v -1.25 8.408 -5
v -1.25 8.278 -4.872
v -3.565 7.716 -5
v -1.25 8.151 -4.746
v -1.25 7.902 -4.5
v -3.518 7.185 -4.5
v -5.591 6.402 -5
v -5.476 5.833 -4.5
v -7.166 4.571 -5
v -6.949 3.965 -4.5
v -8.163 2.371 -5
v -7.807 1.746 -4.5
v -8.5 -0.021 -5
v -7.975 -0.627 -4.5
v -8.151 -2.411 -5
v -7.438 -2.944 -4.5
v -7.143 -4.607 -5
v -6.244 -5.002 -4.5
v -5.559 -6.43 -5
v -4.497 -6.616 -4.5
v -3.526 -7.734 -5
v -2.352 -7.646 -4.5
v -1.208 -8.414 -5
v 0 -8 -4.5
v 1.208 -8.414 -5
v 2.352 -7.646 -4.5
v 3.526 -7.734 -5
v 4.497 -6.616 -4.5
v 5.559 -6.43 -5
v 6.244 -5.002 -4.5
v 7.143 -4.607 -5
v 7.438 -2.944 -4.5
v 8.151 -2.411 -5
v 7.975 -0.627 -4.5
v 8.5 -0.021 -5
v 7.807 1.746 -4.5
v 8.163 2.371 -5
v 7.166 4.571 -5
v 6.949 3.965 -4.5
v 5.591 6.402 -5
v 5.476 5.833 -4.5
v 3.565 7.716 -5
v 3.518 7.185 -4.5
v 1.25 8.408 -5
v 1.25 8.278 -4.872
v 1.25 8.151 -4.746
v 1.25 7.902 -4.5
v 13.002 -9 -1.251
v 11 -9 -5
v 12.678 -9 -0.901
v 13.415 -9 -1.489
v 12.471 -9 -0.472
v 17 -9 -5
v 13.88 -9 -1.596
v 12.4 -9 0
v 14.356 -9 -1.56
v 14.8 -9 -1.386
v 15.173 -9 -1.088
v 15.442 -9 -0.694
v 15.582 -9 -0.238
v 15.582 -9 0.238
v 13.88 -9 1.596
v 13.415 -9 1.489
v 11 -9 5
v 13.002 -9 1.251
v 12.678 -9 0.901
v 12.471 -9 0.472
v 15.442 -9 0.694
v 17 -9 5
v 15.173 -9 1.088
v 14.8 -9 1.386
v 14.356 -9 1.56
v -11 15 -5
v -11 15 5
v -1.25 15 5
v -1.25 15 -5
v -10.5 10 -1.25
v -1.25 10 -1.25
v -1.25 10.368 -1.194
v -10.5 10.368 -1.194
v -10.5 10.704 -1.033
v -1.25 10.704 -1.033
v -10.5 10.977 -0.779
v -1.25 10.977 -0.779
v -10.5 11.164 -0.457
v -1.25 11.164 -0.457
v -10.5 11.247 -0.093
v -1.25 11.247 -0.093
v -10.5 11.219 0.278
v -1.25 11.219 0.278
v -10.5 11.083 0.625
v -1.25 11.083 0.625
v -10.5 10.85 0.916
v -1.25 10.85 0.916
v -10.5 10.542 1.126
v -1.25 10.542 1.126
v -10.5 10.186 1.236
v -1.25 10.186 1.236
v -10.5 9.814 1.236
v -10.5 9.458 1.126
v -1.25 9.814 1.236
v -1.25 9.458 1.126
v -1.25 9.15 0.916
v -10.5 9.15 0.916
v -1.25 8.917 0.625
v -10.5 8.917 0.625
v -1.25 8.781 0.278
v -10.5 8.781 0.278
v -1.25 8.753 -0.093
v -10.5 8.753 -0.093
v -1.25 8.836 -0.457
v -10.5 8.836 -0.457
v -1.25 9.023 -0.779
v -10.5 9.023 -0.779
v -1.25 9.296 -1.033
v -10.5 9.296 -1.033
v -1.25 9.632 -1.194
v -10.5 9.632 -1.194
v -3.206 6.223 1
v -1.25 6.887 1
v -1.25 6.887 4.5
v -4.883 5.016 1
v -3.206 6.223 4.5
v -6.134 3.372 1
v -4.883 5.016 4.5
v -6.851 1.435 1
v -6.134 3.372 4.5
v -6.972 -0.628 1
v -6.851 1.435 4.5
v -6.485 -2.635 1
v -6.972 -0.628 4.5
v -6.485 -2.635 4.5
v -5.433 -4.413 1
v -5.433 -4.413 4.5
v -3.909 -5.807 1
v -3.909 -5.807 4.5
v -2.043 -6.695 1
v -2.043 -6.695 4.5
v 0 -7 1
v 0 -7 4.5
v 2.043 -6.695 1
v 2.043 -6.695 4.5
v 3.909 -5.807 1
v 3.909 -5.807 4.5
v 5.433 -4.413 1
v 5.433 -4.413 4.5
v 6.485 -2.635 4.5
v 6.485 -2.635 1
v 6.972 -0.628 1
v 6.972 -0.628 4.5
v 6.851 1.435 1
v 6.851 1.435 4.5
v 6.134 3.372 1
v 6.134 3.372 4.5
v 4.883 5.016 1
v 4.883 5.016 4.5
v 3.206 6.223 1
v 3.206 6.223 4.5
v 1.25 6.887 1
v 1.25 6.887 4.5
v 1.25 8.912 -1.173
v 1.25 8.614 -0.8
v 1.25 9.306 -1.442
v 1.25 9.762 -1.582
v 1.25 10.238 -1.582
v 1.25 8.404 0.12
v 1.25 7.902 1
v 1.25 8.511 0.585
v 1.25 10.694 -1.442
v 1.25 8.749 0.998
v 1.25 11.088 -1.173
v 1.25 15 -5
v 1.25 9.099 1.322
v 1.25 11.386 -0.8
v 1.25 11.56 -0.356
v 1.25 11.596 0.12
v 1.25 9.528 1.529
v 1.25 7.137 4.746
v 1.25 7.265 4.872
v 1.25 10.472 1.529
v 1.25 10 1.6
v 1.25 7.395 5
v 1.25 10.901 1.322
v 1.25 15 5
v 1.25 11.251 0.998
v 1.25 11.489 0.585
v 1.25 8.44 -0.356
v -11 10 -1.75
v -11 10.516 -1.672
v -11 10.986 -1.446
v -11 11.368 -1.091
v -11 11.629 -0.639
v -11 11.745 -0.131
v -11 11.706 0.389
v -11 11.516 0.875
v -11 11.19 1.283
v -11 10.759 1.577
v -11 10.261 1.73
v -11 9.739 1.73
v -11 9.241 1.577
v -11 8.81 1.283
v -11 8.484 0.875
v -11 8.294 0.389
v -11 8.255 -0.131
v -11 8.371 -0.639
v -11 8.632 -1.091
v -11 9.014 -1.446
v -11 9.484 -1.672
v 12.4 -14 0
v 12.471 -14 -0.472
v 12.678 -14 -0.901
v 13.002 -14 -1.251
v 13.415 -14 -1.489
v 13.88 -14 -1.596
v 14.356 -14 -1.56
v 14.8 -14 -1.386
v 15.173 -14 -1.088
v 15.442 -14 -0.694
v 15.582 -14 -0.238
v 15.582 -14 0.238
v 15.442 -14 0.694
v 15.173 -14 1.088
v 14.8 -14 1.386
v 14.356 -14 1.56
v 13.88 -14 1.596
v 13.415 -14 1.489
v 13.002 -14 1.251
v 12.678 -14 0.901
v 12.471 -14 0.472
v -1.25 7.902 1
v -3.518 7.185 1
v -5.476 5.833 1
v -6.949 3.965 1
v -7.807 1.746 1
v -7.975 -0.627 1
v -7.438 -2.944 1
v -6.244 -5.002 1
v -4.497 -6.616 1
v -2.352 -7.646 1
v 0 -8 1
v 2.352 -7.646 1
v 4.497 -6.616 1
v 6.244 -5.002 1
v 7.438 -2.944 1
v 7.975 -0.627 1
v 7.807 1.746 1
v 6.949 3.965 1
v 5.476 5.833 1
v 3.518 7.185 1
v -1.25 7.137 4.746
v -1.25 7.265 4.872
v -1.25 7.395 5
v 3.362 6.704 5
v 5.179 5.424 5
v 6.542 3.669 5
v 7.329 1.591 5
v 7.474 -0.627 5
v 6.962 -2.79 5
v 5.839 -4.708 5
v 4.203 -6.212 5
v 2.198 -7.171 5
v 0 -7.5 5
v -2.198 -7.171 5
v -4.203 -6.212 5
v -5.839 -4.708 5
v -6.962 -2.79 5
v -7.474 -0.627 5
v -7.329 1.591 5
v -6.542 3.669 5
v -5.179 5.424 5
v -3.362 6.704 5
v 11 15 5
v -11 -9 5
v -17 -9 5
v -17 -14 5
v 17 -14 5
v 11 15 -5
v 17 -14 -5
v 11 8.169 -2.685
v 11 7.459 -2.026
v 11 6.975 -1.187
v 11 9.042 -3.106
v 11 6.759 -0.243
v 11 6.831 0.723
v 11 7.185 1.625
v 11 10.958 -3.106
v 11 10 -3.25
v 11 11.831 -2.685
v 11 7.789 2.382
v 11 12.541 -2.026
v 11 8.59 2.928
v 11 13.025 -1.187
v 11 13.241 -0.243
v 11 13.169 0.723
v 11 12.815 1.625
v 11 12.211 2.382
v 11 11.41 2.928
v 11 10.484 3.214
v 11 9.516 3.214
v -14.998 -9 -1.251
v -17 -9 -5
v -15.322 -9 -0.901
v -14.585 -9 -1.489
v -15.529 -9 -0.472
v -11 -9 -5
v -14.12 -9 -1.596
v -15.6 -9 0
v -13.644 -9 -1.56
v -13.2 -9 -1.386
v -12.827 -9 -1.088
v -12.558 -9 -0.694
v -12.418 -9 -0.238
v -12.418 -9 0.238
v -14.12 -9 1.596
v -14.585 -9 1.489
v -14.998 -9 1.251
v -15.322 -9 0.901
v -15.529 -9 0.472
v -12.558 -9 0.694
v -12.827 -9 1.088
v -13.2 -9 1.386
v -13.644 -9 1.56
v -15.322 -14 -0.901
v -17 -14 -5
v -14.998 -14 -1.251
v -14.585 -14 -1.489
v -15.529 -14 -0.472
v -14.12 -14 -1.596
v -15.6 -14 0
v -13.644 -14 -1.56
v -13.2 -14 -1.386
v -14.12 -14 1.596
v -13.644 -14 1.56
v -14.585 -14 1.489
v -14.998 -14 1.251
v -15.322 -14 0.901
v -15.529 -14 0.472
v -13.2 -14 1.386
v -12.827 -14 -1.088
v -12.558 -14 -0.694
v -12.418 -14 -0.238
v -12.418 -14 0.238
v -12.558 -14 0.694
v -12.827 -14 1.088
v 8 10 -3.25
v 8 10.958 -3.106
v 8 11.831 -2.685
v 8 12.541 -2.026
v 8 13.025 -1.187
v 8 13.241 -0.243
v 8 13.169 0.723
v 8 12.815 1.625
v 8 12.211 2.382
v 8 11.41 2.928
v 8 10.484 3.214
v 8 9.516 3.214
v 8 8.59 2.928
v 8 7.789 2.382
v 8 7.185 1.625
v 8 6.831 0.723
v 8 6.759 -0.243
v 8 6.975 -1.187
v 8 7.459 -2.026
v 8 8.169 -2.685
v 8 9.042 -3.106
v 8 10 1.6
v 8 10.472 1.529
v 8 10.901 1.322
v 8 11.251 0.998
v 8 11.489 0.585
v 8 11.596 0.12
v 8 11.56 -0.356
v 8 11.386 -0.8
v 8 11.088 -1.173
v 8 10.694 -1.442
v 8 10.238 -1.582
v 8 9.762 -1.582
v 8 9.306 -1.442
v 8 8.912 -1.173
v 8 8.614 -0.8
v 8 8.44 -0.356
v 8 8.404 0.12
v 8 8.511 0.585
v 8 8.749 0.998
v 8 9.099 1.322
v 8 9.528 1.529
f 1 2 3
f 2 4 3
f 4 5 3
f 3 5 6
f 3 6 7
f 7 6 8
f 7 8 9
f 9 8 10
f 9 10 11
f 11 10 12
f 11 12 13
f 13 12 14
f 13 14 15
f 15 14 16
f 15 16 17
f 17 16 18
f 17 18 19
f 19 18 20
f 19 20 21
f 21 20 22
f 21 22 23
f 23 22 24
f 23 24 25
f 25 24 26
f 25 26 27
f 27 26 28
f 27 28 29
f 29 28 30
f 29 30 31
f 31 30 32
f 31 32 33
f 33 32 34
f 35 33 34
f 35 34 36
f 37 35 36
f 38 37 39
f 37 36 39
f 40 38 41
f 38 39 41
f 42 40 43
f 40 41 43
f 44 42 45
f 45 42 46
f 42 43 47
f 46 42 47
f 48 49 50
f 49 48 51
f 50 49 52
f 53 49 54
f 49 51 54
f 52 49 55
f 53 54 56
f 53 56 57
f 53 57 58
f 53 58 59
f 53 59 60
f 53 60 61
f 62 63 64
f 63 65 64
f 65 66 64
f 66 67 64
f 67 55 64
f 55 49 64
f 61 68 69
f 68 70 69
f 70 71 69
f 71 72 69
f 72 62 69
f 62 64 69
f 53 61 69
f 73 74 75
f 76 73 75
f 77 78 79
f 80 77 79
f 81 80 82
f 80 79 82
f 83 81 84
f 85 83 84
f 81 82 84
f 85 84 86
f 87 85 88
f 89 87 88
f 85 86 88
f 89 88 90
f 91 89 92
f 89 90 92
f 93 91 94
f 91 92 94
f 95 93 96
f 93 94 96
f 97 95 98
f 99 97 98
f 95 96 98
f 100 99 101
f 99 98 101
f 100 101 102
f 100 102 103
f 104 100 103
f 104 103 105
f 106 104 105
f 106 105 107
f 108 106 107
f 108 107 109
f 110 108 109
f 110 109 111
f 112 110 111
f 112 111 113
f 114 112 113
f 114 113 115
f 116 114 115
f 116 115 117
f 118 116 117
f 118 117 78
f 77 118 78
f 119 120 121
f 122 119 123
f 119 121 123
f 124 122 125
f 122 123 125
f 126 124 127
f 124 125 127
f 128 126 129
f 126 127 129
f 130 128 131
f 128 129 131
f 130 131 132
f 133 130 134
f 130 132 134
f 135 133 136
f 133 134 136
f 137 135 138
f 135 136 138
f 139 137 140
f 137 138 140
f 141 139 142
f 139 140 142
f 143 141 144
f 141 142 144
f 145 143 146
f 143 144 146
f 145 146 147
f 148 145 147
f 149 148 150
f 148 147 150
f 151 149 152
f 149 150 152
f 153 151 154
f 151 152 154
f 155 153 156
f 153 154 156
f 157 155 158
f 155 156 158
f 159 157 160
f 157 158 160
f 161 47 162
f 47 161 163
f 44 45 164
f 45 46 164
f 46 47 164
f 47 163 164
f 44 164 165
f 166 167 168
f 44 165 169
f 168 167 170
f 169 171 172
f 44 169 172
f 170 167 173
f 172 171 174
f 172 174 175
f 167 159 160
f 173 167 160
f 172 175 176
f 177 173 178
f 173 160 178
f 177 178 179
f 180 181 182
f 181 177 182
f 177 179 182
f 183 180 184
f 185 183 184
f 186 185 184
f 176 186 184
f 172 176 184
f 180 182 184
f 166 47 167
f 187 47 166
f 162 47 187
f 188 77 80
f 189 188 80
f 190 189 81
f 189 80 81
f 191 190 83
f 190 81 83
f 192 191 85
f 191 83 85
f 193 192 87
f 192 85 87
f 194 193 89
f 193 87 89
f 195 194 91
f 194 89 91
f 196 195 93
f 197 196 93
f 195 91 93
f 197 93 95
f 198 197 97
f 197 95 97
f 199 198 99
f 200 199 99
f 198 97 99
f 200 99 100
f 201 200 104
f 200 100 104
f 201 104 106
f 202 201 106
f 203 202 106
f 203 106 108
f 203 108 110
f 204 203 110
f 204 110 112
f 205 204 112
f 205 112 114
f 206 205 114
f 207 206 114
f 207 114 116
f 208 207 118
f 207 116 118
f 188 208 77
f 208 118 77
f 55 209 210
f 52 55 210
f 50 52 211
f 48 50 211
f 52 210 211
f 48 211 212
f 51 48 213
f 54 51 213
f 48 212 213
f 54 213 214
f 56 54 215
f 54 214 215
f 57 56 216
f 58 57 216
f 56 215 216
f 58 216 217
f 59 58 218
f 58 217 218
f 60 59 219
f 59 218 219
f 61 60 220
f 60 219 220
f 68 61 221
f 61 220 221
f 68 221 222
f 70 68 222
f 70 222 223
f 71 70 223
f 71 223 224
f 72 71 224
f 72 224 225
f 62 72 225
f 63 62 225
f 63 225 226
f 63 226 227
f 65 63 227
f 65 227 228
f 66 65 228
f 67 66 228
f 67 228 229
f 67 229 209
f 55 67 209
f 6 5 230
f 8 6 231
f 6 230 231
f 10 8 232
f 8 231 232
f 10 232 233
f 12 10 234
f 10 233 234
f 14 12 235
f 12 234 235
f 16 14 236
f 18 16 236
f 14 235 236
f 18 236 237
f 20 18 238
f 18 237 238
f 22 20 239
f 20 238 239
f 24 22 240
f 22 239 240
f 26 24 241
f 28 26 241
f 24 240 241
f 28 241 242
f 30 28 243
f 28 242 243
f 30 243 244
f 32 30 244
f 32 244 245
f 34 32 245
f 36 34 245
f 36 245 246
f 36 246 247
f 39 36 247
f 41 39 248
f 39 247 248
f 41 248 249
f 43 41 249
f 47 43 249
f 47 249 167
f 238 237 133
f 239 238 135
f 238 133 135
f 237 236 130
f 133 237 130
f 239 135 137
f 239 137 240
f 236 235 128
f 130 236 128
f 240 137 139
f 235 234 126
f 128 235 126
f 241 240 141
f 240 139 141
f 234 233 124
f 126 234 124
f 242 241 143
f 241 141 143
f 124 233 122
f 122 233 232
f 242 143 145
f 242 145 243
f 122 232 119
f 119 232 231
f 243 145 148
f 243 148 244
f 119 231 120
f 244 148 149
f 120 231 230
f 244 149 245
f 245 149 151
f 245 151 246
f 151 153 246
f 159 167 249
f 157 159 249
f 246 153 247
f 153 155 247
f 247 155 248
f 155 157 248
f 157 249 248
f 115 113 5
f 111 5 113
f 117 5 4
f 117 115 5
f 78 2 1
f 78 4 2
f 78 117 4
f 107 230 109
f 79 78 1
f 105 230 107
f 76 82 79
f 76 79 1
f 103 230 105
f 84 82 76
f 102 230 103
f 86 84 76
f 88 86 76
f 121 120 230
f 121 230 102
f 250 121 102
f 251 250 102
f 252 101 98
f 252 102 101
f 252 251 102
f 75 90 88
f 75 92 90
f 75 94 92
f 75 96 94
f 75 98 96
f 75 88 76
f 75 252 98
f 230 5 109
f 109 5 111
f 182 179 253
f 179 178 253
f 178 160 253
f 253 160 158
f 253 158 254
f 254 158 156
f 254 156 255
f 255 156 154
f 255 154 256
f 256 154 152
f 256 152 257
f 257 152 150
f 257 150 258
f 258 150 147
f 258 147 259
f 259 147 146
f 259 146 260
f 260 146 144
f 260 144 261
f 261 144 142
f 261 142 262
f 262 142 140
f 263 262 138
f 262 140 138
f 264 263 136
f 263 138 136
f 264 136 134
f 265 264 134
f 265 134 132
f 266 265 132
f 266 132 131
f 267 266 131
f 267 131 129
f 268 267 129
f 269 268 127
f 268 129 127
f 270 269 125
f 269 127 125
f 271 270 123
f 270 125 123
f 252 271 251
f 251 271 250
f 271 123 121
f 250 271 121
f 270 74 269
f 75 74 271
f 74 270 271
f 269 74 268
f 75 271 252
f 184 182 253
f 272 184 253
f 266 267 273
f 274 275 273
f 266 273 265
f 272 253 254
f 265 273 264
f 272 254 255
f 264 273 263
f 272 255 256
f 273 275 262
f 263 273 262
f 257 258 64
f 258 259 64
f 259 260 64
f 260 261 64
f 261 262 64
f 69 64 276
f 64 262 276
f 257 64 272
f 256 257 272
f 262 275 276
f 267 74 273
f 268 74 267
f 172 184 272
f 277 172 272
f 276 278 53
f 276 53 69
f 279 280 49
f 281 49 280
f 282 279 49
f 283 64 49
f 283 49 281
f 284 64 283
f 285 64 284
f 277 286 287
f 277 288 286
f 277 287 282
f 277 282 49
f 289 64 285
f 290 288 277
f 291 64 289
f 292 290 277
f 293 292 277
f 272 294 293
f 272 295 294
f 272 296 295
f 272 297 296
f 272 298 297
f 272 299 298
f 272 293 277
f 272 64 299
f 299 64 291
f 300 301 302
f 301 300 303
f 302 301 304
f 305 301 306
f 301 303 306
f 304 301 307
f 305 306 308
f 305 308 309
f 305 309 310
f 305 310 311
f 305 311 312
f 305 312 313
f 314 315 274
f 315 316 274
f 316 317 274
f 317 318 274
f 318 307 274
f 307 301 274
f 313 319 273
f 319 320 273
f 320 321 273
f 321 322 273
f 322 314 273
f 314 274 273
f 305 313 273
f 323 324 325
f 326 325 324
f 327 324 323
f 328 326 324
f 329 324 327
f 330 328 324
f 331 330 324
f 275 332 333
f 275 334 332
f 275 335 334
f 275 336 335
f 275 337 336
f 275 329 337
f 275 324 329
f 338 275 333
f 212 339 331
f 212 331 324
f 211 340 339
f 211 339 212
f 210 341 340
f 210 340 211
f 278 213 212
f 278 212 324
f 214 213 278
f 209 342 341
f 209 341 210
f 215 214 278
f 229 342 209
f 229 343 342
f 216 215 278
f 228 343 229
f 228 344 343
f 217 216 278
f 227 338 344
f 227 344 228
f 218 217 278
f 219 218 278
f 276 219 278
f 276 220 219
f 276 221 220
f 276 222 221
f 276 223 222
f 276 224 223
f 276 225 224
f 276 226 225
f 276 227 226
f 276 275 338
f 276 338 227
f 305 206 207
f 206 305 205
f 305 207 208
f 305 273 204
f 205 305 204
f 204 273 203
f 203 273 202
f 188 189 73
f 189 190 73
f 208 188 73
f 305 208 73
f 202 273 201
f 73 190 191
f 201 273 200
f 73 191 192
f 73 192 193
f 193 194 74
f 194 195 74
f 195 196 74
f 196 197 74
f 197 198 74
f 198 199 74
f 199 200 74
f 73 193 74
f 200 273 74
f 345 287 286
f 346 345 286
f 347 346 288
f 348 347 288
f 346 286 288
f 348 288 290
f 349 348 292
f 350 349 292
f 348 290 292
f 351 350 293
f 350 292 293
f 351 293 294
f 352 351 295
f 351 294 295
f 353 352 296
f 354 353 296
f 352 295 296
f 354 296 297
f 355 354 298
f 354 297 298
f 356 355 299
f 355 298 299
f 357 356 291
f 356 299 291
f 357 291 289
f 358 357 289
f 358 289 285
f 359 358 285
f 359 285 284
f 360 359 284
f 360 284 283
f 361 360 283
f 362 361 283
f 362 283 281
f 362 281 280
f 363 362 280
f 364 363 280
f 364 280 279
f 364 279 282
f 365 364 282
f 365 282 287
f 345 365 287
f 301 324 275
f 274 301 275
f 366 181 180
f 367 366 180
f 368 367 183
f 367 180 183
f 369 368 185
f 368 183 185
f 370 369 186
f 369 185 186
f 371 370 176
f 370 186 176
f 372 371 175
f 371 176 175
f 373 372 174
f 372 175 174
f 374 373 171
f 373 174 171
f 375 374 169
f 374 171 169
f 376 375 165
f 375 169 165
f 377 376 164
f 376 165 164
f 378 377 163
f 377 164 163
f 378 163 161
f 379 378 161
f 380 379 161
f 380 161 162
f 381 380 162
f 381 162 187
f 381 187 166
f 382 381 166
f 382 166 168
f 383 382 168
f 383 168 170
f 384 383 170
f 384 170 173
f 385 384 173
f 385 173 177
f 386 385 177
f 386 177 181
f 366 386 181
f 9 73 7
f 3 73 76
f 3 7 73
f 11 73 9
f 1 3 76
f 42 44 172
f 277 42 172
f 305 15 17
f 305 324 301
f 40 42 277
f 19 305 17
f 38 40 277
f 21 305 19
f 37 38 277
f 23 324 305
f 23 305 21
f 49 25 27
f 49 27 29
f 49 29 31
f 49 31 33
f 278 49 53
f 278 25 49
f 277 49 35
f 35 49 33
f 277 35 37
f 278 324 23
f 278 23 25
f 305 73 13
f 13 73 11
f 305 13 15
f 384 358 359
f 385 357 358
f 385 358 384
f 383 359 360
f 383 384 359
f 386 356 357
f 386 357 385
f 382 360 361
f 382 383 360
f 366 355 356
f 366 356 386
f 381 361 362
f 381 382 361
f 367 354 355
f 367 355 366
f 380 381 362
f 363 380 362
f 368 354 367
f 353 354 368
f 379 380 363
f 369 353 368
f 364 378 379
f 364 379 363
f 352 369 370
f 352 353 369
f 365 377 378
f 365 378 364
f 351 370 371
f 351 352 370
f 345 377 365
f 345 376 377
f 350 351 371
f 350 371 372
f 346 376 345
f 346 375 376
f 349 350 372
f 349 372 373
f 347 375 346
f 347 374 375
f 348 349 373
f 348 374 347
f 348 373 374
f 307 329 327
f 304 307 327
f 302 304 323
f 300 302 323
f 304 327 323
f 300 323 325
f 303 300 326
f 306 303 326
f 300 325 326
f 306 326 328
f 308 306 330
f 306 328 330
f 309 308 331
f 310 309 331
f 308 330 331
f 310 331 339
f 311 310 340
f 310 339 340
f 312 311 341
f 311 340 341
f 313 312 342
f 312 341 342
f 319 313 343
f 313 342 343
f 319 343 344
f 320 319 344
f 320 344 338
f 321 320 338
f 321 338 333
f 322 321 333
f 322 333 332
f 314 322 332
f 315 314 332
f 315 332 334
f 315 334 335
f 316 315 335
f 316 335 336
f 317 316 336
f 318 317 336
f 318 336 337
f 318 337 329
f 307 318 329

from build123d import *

# Parameters (mm, degrees)
SKETCH1_W                      = 22
SKETCH1_H                      = 29
BOSS_EXTRUDE1_DEPTH            = 5
SKETCH3_W                      = 34
SKETCH3_H                      = 10
BOSS_EXTRUDE2_DEPTH            = 5
F_16_0_16_DIAMETER_HOLE1_D     = 16
F_16_0_16_DIAMETER_HOLE1_DEPTH = 6
F_14_0_14_DIAMETER_HOLE1_D     = 14
M3_CLEARANCE_HOLE1_D           = 3.2
SKETCH12_W                     = 2.5
SKETCH12_H                     = 8.112511343
CUT_EXTRUDE1_DEPTH             = 25.779023387
M3X0_5_TAPPED_HOLE1_D          = 2.5
M3X0_5_TAPPED_HOLE1_DEPTH      = 9.75
CBORE_FOR_M3_SHCS1_D           = 3.2
CBORE_FOR_M3_SHCS1_DEPTH       = 9.75
CBORE_FOR_M3_SHCS1_CBORE_D     = 6.5
CBORE_FOR_M3_SHCS1_CBORE_DEPTH = 3
CHAMFER1_SIZE                  = 0.5


with BuildPart() as part:
    # Sketch1 → Boss-Extrude1 (new, symmetric)
    with BuildSketch(Plane.XY):
        with Locations((0, 0.5)):
            Rectangle(SKETCH1_W, SKETCH1_H)
    extrude(amount=BOSS_EXTRUDE1_DEPTH, both=True)

    # Sketch3 → Boss-Extrude2 (add)
    with BuildSketch(Plane.XZ.offset(14)):
        Rectangle(SKETCH3_W, SKETCH3_H)
    extrude(amount=-BOSS_EXTRUDE2_DEPTH)

    # Ø16.0 (16) Diameter Hole1
    with Locations(Plane(origin=(0, 0, -5), x_dir=(-1, 0, 0), z_dir=(0, 0, -1))):
        with Locations((0, 0)):
            Hole(F_16_0_16_DIAMETER_HOLE1_D / 2, depth=F_16_0_16_DIAMETER_HOLE1_DEPTH)

    # Ø14.0 (14) Diameter Hole1 (through all)
    with Locations(Plane(origin=(0, 0, 1), x_dir=(-1, 0, 0), z_dir=(0, 0, -1))):
        with Locations((0, 0)):
            Hole(F_14_0_14_DIAMETER_HOLE1_D / 2)

    # M3 Clearance Hole1 (through all)
    with Locations(Plane(origin=(0, -9, 0), x_dir=(1, 0, 0), z_dir=(0, 1, 0))):
        with Locations((-14, 0), (14, 0)):
            Hole(M3_CLEARANCE_HOLE1_D / 2)

    # Sketch12 → Cut-Extrude1 (cut, through all)
    with BuildSketch(Plane.XY.offset(5)):
        with Locations((0, 10.943744329)):
            Rectangle(SKETCH12_W, SKETCH12_H)
    extrude(amount=-CUT_EXTRUDE1_DEPTH, mode=Mode.SUBTRACT)

    # M3x0.5 Tapped Hole1
    with Locations(Plane.ZY.offset(11)):
        with Locations((0, 10)):
            Hole(M3X0_5_TAPPED_HOLE1_D / 2, depth=M3X0_5_TAPPED_HOLE1_DEPTH)

    # CBORE for M3 SHCS1
    with Locations(Plane(origin=(11, 0, 0), x_dir=(0, 0, -1), z_dir=(1, 0, 0))):
        with Locations((0, 10)):
            CounterBoreHole(CBORE_FOR_M3_SHCS1_D / 2, CBORE_FOR_M3_SHCS1_CBORE_D / 2, CBORE_FOR_M3_SHCS1_CBORE_DEPTH, depth=CBORE_FOR_M3_SHCS1_DEPTH)

    # Chamfer1
    chamfer1_edges = [part.edges().sort_by_distance(p)[0] for p in [
        (0, -7, 5),
        (0, -8, -5),
        (-11, 10, 1.25),
    ]]
    chamfer(chamfer1_edges, length=CHAMFER1_SIZE)


solid = part.part
